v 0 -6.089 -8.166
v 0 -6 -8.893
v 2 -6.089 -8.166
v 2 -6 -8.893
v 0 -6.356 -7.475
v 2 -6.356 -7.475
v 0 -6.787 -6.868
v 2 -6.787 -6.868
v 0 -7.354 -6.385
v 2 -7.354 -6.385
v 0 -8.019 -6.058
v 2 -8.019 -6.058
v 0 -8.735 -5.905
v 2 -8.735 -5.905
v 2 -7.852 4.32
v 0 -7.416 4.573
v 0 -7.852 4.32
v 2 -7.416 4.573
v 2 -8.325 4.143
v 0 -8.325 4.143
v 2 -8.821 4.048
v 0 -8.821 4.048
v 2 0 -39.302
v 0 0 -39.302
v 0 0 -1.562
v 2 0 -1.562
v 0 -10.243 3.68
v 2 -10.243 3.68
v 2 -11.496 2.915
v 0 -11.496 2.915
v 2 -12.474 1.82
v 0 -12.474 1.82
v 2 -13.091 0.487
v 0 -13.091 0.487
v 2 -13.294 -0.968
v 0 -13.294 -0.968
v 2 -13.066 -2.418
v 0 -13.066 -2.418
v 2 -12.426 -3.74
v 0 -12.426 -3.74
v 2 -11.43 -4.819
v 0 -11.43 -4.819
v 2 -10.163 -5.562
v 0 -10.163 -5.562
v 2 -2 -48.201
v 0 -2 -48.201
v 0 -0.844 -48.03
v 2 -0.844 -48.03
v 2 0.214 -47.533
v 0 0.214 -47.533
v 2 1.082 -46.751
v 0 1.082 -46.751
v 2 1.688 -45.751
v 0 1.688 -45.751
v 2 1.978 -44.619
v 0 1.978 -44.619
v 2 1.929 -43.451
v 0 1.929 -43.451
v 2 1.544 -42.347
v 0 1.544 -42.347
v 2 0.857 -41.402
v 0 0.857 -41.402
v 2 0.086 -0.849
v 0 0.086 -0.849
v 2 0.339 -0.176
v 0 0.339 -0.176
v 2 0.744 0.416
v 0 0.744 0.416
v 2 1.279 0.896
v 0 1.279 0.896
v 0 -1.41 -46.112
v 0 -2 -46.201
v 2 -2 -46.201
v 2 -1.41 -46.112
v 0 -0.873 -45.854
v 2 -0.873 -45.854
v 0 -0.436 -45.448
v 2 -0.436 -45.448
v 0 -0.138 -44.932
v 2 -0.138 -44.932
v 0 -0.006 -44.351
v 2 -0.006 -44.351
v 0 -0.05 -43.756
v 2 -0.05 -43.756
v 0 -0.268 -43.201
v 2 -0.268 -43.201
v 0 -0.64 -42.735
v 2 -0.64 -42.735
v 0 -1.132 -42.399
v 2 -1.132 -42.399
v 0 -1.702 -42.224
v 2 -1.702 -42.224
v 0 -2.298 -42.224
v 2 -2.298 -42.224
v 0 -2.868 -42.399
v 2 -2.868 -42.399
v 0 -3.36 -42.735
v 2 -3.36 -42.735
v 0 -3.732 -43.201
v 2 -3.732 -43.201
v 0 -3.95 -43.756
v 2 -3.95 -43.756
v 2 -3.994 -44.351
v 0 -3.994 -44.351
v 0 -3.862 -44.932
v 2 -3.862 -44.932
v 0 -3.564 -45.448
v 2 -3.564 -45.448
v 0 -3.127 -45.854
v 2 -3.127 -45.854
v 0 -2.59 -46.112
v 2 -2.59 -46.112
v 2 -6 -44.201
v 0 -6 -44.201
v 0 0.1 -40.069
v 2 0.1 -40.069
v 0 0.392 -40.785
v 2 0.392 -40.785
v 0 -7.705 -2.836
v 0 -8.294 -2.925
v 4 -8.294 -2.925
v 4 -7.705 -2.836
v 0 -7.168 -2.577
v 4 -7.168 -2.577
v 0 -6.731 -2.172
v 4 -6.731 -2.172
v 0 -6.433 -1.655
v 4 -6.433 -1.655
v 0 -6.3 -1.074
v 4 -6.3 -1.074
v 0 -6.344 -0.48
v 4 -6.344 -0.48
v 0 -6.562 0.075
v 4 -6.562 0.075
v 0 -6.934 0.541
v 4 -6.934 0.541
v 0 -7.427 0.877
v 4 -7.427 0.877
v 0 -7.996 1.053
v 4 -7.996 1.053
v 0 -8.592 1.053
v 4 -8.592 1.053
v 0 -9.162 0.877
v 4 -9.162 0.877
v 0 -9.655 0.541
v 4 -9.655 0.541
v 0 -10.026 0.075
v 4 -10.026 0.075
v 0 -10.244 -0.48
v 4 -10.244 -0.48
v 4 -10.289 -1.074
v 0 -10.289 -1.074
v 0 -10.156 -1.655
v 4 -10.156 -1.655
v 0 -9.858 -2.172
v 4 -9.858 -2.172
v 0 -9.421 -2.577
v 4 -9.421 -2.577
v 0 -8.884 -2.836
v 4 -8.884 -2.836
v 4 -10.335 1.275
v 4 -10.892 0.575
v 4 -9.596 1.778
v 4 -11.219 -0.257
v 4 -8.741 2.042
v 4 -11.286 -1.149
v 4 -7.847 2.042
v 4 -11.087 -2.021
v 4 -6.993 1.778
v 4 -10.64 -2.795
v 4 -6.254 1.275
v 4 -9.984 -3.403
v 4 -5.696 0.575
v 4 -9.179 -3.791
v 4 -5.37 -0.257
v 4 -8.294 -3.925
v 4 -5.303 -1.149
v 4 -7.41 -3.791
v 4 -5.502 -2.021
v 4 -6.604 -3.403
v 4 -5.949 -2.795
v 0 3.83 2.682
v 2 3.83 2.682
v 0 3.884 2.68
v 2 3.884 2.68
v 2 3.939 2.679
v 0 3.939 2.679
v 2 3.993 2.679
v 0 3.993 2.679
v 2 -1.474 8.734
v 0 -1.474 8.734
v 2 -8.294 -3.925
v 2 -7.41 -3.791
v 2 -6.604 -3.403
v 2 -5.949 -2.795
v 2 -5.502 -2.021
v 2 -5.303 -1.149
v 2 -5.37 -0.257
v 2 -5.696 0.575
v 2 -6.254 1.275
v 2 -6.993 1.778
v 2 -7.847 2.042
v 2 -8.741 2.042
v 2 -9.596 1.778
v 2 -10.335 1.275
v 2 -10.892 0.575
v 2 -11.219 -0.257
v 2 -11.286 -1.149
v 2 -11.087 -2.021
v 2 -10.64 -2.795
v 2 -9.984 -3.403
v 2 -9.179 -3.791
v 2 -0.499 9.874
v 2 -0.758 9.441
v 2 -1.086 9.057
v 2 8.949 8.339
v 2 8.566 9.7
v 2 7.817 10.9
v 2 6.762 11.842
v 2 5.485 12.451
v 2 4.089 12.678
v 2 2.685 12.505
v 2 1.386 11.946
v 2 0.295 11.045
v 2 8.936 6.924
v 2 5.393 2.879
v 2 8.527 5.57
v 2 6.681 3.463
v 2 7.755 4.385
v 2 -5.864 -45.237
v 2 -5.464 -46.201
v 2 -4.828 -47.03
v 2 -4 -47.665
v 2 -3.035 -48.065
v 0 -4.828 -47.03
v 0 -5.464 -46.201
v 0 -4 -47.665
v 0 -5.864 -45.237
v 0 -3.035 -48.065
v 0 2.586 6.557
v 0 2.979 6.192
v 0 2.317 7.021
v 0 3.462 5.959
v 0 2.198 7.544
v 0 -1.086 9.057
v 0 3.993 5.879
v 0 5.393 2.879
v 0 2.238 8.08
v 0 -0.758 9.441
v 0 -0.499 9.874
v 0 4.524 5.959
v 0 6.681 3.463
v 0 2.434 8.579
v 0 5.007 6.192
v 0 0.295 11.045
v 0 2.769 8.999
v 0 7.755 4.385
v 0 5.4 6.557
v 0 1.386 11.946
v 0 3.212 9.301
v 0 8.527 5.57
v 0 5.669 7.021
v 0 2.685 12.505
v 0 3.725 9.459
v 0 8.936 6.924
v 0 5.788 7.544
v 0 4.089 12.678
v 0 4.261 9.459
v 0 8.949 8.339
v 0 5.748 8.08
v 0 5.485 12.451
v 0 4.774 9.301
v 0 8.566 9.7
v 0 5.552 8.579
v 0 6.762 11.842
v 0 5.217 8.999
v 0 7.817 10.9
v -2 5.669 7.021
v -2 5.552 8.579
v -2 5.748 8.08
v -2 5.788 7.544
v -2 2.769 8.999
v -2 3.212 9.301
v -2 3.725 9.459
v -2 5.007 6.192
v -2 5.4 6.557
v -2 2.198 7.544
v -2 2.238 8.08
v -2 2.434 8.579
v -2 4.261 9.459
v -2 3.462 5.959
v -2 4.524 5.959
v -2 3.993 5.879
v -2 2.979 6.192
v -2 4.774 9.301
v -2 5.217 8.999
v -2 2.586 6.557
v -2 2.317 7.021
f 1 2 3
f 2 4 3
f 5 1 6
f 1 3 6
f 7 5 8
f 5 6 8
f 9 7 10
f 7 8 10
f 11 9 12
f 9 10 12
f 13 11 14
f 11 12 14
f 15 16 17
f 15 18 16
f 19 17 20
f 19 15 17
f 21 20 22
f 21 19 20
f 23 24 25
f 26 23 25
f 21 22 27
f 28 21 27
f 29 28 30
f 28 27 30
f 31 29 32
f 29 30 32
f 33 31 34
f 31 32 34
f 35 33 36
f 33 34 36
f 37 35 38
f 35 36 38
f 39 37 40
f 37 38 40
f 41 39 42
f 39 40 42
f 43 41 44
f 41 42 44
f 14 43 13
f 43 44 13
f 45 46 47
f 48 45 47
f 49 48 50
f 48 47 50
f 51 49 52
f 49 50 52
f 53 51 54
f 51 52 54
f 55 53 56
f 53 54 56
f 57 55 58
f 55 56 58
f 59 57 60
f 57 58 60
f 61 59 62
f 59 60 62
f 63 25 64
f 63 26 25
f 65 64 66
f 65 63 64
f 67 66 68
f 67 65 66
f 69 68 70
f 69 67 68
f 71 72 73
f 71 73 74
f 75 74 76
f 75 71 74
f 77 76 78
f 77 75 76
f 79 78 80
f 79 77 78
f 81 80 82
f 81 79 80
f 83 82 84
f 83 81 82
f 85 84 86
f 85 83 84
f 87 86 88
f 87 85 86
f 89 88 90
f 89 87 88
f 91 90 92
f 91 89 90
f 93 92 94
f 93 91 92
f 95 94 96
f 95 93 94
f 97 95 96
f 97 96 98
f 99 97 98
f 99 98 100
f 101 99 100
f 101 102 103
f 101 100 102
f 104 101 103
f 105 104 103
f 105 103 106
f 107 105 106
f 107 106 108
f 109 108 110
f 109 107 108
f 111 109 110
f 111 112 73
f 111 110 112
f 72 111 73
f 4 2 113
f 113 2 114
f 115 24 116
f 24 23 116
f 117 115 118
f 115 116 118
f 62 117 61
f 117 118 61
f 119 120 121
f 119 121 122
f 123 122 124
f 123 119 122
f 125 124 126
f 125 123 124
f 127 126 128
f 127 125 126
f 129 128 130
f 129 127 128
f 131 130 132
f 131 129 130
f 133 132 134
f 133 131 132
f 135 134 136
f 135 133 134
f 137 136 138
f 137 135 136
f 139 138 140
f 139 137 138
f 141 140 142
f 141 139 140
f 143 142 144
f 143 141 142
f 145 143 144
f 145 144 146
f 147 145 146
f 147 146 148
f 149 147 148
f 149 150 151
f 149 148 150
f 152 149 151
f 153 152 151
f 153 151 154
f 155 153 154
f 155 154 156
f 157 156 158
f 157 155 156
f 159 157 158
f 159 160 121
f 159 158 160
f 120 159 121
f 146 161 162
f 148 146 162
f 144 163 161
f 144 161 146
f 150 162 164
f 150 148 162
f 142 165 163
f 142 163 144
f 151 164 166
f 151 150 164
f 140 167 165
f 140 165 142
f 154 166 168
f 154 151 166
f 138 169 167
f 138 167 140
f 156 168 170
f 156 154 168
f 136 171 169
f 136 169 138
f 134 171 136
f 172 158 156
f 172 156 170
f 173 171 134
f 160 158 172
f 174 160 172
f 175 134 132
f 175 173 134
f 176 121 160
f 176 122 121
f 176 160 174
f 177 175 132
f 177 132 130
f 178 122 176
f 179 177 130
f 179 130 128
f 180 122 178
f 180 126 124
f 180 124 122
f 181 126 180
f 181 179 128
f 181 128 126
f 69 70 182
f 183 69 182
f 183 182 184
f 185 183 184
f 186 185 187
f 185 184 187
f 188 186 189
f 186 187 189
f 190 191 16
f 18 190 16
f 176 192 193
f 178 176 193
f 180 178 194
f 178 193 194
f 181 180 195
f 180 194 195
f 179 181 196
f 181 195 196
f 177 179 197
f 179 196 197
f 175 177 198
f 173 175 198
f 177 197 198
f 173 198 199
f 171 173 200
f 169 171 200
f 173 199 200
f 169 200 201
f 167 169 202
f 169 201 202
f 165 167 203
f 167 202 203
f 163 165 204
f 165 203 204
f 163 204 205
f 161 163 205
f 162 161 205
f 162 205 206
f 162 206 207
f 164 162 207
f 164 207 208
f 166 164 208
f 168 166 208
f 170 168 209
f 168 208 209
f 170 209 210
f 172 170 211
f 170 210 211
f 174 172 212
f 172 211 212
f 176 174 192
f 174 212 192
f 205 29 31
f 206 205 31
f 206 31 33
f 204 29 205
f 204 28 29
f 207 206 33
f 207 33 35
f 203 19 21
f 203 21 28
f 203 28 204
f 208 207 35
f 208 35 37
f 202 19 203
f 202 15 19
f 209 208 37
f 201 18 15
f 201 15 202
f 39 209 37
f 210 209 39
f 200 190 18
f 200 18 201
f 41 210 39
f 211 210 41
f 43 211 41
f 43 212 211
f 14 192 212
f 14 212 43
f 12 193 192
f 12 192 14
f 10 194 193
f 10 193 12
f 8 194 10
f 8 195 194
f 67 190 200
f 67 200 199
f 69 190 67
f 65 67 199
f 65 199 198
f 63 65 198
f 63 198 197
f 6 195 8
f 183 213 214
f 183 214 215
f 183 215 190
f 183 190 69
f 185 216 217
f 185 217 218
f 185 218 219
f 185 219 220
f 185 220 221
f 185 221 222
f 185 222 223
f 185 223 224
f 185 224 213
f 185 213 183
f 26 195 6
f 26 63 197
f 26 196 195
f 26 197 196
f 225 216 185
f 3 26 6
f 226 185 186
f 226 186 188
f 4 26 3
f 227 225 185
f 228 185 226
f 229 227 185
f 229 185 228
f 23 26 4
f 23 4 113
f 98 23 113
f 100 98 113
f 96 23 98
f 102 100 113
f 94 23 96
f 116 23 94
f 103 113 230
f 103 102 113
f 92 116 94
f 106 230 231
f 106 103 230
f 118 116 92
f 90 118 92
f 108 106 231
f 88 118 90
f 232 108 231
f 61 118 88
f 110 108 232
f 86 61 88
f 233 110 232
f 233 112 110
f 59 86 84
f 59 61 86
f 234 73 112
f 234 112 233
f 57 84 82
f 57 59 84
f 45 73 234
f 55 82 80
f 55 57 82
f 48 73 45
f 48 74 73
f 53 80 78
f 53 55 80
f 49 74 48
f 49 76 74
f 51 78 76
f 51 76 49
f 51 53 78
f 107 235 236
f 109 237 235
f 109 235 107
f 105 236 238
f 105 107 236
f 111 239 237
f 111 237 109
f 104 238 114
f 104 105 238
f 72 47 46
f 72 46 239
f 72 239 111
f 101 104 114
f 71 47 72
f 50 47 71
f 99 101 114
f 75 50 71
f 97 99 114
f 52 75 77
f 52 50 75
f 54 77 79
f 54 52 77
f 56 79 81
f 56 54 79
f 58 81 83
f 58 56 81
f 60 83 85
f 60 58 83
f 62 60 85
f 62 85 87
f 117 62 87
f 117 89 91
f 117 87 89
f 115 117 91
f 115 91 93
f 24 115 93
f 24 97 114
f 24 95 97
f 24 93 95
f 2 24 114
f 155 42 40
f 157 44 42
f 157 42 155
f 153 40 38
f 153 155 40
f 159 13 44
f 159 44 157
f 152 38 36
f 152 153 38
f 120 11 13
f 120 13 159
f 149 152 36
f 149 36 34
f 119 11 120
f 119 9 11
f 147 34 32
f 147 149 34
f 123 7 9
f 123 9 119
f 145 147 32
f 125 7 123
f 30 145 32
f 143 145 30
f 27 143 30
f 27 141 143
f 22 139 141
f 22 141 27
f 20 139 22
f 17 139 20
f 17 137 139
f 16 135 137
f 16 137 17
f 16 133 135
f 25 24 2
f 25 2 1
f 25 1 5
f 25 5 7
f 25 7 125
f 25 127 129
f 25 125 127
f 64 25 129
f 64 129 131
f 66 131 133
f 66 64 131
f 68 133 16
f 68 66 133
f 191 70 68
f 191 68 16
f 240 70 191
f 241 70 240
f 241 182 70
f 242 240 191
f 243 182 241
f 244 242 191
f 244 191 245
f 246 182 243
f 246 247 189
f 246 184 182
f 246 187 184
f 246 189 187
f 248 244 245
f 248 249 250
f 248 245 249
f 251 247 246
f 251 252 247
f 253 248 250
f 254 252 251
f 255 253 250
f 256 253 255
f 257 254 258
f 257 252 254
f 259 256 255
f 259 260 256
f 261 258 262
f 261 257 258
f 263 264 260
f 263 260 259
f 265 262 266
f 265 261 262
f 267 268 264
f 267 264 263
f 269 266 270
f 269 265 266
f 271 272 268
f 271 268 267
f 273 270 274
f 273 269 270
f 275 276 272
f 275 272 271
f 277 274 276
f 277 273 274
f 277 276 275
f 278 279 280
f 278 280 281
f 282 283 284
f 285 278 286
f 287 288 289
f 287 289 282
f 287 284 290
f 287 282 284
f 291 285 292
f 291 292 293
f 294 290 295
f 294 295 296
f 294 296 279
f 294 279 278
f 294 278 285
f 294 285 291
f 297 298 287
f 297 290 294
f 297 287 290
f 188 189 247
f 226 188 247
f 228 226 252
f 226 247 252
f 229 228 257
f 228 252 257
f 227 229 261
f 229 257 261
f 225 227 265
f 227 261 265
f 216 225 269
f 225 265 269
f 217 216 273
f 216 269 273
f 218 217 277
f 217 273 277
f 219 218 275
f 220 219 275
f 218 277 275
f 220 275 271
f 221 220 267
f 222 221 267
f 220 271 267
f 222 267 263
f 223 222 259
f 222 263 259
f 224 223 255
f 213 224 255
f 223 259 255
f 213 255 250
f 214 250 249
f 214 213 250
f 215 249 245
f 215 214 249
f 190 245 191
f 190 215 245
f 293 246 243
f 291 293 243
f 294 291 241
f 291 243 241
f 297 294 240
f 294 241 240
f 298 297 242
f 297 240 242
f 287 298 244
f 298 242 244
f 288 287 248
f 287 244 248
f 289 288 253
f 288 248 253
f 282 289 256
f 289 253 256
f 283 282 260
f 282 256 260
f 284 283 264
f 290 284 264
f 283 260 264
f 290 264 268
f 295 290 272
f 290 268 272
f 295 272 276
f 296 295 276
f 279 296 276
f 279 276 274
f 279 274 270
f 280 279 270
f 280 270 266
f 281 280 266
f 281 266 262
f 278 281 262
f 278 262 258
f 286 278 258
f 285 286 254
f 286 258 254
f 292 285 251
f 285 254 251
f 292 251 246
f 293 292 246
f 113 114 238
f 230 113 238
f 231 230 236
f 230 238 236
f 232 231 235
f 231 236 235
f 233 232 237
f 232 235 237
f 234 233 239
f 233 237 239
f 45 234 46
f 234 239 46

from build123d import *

# Parameters (mm, degrees)
EXTRUDE_1_DEPTH          = 2
EXTRUDE_START            = 2
SKETCH_1_4_R             = 3
EXTRUDE_2_DEPTH          = 2
CUT_EXTRUDE_1_DEPTH      = 51.160727735
CUT_EXTRUDE_1_DEPTH_BACK = 51.160727735
SKETCH_1_3_R             = 2
FILLET_1_R               = 3
SKETCH_2_R               = 2
EXTRUDE_3_DEPTH          = 2
SKETCH_2_3_R             = 1.8
EXTRUDE_4_DEPTH          = 2


with BuildPart() as part:
    # 草图1 → 凸台-拉伸1 (new body)
    with BuildSketch(Plane(origin=(0, 0, 0), x_dir=(0, 0, -1), z_dir=(1, 0, 0))):
        with BuildLine():
            Line((40.737143614, 0), (0, 0))
            Line((0, 0), (2.48051592, -3.542543867))
            ThreePointArc((2.48051592, -3.542543867), (4.165783411, -4.487079684), (5.367176995, -6))
            Line((5.367176995, -6), (44.201245229, -6))
            ThreePointArc((44.201245229, -6), (40.737143614, -4), (40.737143614, 0))
        make_face()
        with BuildLine():
            Line((2.48051592, -3.542543867), (0, 0))
            Line((0, 0), (-2.681672007, 3.829824531))
            ThreePointArc((-2.681672007, 3.829824531), (-4.811127311, -0.102785303), (-9.234888361, -0.758786959))
            Line((-9.234888361, -0.758786959), (-4.072700434, -8.131155358))
            ThreePointArc((-4.072700434, -8.131155358), (-1.94324513, -4.198545524), (2.48051592, -3.542543867))
        make_face()
        with BuildLine():
            ThreePointArc((48.201245229, -2), (45.23652141, 1.863703305), (40.737143614, 0))
            Line((40.737143614, 0), (44.201245229, 0))
            ThreePointArc((44.201245229, 0), (45.615458792, -0.585786438), (46.201245229, -2))
            ThreePointArc((46.201245229, -2), (45.615458792, -3.414213562), (44.201245229, -4))
            Line((44.201245229, -4), (44.201245229, -6))
            ThreePointArc((44.201245229, -6), (47.029672354, -4.828427125), (48.201245229, -2))
        make_face()
        with BuildLine():
            Line((44.201245229, 0), (40.737143614, 0))
            ThreePointArc((40.737143614, 0), (40.737143614, -4), (44.201245229, -6))
            Line((44.201245229, -6), (44.201245229, -4))
            ThreePointArc((44.201245229, -4), (42.201245229, -2), (44.201245229, 0))
        make_face()
        with BuildLine():
            ThreePointArc((5.367176995, -6), (4.165783411, -4.487079684), (2.48051592, -3.542543867))
            Line((2.48051592, -3.542543867), (4.201245229, -6))
            Line((4.201245229, -6), (5.367176995, -6))
        make_face()
        with BuildLine():
            Line((4.201245229, -6), (2.48051592, -3.542543867))
            ThreePointArc((2.48051592, -3.542543867), (-1.94324513, -4.198545524), (-4.072700434, -8.131155358))
            Line((-4.072700434, -8.131155358), (-2.351971125, -10.588611491))
            Line((-2.351971125, -10.588611491), (-1.532819081, -10.015035054))
            ThreePointArc((-1.532819081, -10.015035054), (-0.796092257, -5.836849613), (3.382093185, -6.573576436))
            Line((3.382093185, -6.573576436), (4.201245229, -6))
        make_face()
        with BuildLine():
            ThreePointArc((-9.234888361, -0.758786959), (-4.811127311, -0.102785303), (-2.681672007, 3.829824531))
            Line((-2.681672007, 3.829824531), (-4.402401316, 6.287280664))
            Line((-4.402401316, 6.287280664), (-6.040705405, 5.140127792))
            ThreePointArc((-6.040705405, 5.140127792), (-5.771575592, 4.594386518), (-5.679009493, 3.992974919))
            ThreePointArc((-5.679009493, 3.992974919), (-7.077597894, 2.085541017), (-9.317313582, 2.845822046))
            Line((-9.317313582, 2.845822046), (-10.95561767, 1.698669174))
            Line((-10.95561767, 1.698669174), (-9.234888361, -0.758786959))
        make_face()
        with BuildLine():
            Line((-4.402401316, 6.287280664), (-2.681672007, 3.829824531))
            ThreePointArc((-2.681672007, 3.829824531), (-2.679675166, 3.911388863), (-2.679009493, 3.992974919))
            ThreePointArc((-2.679009493, 3.992974919), (-10.613341245, 8.041394014), (-9.234888361, -0.758786959))
            Line((-9.234888361, -0.758786959), (-10.95561767, 1.698669174))
            Line((-10.95561767, 1.698669174), (-9.317313582, 2.845822046))
            ThreePointArc((-9.317313582, 2.845822046), (-8.826162366, 5.631279008), (-6.040705405, 5.140127792))
            Line((-6.040705405, 5.140127792), (-4.402401316, 6.287280664))
        make_face()
        with BuildLine():
            ThreePointArc((46.201245229, -2), (45.615458792, -0.585786438), (44.201245229, 0))
            Line((44.201245229, 0), (44.201245229, -4))
            ThreePointArc((44.201245229, -4), (45.615458792, -3.414213562), (46.201245229, -2))
        make_face()
        with BuildLine():
            Line((44.201245229, -4), (44.201245229, 0))
            ThreePointArc((44.201245229, 0), (42.201245229, -2), (44.201245229, -4))
        make_face()
        with BuildLine():
            Line((5.367176995, -6), (4.201245229, -6))
            Line((4.201245229, -6), (3.382093185, -6.573576436))
            ThreePointArc((3.382093185, -6.573576436), (3.785787904, -7.392188347), (3.924637052, -8.294305745))
            ThreePointArc((3.924637052, -8.294305745), (1.826754451, -11.155456598), (-1.532819081, -10.015035054))
            Line((-1.532819081, -10.015035054), (-2.351971125, -10.588611491))
            Line((-2.351971125, -10.588611491), (-4.072700434, -8.131155358))
            ThreePointArc((-4.072700434, -8.131155358), (0.843050996, -13.293640073), (5.924637052, -8.294305745))
            ThreePointArc((5.924637052, -8.294305745), (5.783273678, -7.113776143), (5.367176995, -6))
        make_face()
        with BuildLine():
            ThreePointArc((3.924637052, -8.294305745), (3.785787904, -7.392188347), (3.382093185, -6.573576436))
            Line((3.382093185, -6.573576436), (2.562941141, -7.147152873))
            ThreePointArc((2.562941141, -7.147152873), (2.832070954, -7.692894146), (2.924637052, -8.294305745))
            ThreePointArc((2.924637052, -8.294305745), (1.526048651, -10.201739647), (-0.713667036, -9.441458618))
            Line((-0.713667036, -9.441458618), (-1.532819081, -10.015035054))
            ThreePointArc((-1.532819081, -10.015035054), (1.826754451, -11.155456598), (3.924637052, -8.294305745))
        make_face()
        with BuildLine():
            Line((2.562941141, -7.147152873), (3.382093185, -6.573576436))
            ThreePointArc((3.382093185, -6.573576436), (-0.796092257, -5.836849613), (-1.532819081, -10.015035054))
            Line((-1.532819081, -10.015035054), (-0.713667036, -9.441458618))
            ThreePointArc((-0.713667036, -9.441458618), (-0.222515821, -6.656001657), (2.562941141, -7.147152873))
        make_face()
        with BuildLine():
            ThreePointArc((-5.679009493, 3.992974919), (-5.771575592, 4.594386518), (-6.040705405, 5.140127792))
            Line((-6.040705405, 5.140127792), (-9.317313582, 2.845822046))
            ThreePointArc((-9.317313582, 2.845822046), (-7.077597894, 2.085541017), (-5.679009493, 3.992974919))
        make_face()
        with BuildLine():
            Line((-9.317313582, 2.845822046), (-6.040705405, 5.140127792))
            ThreePointArc((-6.040705405, 5.140127792), (-8.826162366, 5.631279008), (-9.317313582, 2.845822046))
        make_face()
        with BuildLine():
            ThreePointArc((2.924637052, -8.294305745), (2.832070954, -7.692894146), (2.562941141, -7.147152873))
            Line((2.562941141, -7.147152873), (-0.713667036, -9.441458618))
            ThreePointArc((-0.713667036, -9.441458618), (1.526048651, -10.201739647), (2.924637052, -8.294305745))
        make_face()
        with BuildLine():
            Line((-0.713667036, -9.441458618), (2.562941141, -7.147152873))
            ThreePointArc((2.562941141, -7.147152873), (-0.222515821, -6.656001657), (-0.713667036, -9.441458618))
        make_face()
    extrude(amount=EXTRUDE_1_DEPTH)

    # 草图1<4> → 凸台-拉伸2 (add)
    with BuildSketch(Plane(origin=(0, 0, 0), x_dir=(0, 0, -1), z_dir=(1, 0, 0)).offset(EXTRUDE_START)):
        with Locations((0.924637052, -8.294305745)):
            Circle(SKETCH_1_4_R)
    extrude(amount=EXTRUDE_2_DEPTH)

    # 草图1<3> → 切除-拉伸1 (cut, two sides: drawn at the far end of the back side and taken through both)
    with BuildSketch(Plane(origin=(0, 0, 0), x_dir=(0, 0, -1), z_dir=(1, 0, 0)).offset(-CUT_EXTRUDE_1_DEPTH_BACK)):
        with Locations((-7.679009493, 3.992974919)):
            Circle(SKETCH_1_3_R)
        with Locations((44.201245229, -2)):
            Circle(SKETCH_1_3_R)
        with Locations((0.924637052, -8.294305745)):
            Circle(SKETCH_1_3_R)
    extrude(amount=CUT_EXTRUDE_1_DEPTH + CUT_EXTRUDE_1_DEPTH_BACK, mode=Mode.SUBTRACT)

    # 圆角1
    fillet_1_edges = [part.edges().sort_by_distance(p)[0] for p in [
        (1, -6, -5.367176995),
        (1, 0, 0),
        (1, 0, -40.737143614),
        (1, -0.758786959, 9.234888361),
        (1, -8.131155358, 4.072700434),
    ]]
    fillet(fillet_1_edges, radius=FILLET_1_R)

    # 草图2 → 凸台-拉伸3 (add)
    with BuildSketch(Plane.ZY):
        with Locations((7.679009493, 3.992974919)):
            Circle(SKETCH_2_R)
    extrude(amount=-EXTRUDE_3_DEPTH)

    # 草图2<3> → 凸台-拉伸4 (add)
    with BuildSketch(Plane.ZY):
        with Locations(Location((7.679009493, 3.992974919, 0), (0, 0, 180))):
            Circle(SKETCH_2_3_R)
    extrude(amount=EXTRUDE_4_DEPTH)


solid = part.part
